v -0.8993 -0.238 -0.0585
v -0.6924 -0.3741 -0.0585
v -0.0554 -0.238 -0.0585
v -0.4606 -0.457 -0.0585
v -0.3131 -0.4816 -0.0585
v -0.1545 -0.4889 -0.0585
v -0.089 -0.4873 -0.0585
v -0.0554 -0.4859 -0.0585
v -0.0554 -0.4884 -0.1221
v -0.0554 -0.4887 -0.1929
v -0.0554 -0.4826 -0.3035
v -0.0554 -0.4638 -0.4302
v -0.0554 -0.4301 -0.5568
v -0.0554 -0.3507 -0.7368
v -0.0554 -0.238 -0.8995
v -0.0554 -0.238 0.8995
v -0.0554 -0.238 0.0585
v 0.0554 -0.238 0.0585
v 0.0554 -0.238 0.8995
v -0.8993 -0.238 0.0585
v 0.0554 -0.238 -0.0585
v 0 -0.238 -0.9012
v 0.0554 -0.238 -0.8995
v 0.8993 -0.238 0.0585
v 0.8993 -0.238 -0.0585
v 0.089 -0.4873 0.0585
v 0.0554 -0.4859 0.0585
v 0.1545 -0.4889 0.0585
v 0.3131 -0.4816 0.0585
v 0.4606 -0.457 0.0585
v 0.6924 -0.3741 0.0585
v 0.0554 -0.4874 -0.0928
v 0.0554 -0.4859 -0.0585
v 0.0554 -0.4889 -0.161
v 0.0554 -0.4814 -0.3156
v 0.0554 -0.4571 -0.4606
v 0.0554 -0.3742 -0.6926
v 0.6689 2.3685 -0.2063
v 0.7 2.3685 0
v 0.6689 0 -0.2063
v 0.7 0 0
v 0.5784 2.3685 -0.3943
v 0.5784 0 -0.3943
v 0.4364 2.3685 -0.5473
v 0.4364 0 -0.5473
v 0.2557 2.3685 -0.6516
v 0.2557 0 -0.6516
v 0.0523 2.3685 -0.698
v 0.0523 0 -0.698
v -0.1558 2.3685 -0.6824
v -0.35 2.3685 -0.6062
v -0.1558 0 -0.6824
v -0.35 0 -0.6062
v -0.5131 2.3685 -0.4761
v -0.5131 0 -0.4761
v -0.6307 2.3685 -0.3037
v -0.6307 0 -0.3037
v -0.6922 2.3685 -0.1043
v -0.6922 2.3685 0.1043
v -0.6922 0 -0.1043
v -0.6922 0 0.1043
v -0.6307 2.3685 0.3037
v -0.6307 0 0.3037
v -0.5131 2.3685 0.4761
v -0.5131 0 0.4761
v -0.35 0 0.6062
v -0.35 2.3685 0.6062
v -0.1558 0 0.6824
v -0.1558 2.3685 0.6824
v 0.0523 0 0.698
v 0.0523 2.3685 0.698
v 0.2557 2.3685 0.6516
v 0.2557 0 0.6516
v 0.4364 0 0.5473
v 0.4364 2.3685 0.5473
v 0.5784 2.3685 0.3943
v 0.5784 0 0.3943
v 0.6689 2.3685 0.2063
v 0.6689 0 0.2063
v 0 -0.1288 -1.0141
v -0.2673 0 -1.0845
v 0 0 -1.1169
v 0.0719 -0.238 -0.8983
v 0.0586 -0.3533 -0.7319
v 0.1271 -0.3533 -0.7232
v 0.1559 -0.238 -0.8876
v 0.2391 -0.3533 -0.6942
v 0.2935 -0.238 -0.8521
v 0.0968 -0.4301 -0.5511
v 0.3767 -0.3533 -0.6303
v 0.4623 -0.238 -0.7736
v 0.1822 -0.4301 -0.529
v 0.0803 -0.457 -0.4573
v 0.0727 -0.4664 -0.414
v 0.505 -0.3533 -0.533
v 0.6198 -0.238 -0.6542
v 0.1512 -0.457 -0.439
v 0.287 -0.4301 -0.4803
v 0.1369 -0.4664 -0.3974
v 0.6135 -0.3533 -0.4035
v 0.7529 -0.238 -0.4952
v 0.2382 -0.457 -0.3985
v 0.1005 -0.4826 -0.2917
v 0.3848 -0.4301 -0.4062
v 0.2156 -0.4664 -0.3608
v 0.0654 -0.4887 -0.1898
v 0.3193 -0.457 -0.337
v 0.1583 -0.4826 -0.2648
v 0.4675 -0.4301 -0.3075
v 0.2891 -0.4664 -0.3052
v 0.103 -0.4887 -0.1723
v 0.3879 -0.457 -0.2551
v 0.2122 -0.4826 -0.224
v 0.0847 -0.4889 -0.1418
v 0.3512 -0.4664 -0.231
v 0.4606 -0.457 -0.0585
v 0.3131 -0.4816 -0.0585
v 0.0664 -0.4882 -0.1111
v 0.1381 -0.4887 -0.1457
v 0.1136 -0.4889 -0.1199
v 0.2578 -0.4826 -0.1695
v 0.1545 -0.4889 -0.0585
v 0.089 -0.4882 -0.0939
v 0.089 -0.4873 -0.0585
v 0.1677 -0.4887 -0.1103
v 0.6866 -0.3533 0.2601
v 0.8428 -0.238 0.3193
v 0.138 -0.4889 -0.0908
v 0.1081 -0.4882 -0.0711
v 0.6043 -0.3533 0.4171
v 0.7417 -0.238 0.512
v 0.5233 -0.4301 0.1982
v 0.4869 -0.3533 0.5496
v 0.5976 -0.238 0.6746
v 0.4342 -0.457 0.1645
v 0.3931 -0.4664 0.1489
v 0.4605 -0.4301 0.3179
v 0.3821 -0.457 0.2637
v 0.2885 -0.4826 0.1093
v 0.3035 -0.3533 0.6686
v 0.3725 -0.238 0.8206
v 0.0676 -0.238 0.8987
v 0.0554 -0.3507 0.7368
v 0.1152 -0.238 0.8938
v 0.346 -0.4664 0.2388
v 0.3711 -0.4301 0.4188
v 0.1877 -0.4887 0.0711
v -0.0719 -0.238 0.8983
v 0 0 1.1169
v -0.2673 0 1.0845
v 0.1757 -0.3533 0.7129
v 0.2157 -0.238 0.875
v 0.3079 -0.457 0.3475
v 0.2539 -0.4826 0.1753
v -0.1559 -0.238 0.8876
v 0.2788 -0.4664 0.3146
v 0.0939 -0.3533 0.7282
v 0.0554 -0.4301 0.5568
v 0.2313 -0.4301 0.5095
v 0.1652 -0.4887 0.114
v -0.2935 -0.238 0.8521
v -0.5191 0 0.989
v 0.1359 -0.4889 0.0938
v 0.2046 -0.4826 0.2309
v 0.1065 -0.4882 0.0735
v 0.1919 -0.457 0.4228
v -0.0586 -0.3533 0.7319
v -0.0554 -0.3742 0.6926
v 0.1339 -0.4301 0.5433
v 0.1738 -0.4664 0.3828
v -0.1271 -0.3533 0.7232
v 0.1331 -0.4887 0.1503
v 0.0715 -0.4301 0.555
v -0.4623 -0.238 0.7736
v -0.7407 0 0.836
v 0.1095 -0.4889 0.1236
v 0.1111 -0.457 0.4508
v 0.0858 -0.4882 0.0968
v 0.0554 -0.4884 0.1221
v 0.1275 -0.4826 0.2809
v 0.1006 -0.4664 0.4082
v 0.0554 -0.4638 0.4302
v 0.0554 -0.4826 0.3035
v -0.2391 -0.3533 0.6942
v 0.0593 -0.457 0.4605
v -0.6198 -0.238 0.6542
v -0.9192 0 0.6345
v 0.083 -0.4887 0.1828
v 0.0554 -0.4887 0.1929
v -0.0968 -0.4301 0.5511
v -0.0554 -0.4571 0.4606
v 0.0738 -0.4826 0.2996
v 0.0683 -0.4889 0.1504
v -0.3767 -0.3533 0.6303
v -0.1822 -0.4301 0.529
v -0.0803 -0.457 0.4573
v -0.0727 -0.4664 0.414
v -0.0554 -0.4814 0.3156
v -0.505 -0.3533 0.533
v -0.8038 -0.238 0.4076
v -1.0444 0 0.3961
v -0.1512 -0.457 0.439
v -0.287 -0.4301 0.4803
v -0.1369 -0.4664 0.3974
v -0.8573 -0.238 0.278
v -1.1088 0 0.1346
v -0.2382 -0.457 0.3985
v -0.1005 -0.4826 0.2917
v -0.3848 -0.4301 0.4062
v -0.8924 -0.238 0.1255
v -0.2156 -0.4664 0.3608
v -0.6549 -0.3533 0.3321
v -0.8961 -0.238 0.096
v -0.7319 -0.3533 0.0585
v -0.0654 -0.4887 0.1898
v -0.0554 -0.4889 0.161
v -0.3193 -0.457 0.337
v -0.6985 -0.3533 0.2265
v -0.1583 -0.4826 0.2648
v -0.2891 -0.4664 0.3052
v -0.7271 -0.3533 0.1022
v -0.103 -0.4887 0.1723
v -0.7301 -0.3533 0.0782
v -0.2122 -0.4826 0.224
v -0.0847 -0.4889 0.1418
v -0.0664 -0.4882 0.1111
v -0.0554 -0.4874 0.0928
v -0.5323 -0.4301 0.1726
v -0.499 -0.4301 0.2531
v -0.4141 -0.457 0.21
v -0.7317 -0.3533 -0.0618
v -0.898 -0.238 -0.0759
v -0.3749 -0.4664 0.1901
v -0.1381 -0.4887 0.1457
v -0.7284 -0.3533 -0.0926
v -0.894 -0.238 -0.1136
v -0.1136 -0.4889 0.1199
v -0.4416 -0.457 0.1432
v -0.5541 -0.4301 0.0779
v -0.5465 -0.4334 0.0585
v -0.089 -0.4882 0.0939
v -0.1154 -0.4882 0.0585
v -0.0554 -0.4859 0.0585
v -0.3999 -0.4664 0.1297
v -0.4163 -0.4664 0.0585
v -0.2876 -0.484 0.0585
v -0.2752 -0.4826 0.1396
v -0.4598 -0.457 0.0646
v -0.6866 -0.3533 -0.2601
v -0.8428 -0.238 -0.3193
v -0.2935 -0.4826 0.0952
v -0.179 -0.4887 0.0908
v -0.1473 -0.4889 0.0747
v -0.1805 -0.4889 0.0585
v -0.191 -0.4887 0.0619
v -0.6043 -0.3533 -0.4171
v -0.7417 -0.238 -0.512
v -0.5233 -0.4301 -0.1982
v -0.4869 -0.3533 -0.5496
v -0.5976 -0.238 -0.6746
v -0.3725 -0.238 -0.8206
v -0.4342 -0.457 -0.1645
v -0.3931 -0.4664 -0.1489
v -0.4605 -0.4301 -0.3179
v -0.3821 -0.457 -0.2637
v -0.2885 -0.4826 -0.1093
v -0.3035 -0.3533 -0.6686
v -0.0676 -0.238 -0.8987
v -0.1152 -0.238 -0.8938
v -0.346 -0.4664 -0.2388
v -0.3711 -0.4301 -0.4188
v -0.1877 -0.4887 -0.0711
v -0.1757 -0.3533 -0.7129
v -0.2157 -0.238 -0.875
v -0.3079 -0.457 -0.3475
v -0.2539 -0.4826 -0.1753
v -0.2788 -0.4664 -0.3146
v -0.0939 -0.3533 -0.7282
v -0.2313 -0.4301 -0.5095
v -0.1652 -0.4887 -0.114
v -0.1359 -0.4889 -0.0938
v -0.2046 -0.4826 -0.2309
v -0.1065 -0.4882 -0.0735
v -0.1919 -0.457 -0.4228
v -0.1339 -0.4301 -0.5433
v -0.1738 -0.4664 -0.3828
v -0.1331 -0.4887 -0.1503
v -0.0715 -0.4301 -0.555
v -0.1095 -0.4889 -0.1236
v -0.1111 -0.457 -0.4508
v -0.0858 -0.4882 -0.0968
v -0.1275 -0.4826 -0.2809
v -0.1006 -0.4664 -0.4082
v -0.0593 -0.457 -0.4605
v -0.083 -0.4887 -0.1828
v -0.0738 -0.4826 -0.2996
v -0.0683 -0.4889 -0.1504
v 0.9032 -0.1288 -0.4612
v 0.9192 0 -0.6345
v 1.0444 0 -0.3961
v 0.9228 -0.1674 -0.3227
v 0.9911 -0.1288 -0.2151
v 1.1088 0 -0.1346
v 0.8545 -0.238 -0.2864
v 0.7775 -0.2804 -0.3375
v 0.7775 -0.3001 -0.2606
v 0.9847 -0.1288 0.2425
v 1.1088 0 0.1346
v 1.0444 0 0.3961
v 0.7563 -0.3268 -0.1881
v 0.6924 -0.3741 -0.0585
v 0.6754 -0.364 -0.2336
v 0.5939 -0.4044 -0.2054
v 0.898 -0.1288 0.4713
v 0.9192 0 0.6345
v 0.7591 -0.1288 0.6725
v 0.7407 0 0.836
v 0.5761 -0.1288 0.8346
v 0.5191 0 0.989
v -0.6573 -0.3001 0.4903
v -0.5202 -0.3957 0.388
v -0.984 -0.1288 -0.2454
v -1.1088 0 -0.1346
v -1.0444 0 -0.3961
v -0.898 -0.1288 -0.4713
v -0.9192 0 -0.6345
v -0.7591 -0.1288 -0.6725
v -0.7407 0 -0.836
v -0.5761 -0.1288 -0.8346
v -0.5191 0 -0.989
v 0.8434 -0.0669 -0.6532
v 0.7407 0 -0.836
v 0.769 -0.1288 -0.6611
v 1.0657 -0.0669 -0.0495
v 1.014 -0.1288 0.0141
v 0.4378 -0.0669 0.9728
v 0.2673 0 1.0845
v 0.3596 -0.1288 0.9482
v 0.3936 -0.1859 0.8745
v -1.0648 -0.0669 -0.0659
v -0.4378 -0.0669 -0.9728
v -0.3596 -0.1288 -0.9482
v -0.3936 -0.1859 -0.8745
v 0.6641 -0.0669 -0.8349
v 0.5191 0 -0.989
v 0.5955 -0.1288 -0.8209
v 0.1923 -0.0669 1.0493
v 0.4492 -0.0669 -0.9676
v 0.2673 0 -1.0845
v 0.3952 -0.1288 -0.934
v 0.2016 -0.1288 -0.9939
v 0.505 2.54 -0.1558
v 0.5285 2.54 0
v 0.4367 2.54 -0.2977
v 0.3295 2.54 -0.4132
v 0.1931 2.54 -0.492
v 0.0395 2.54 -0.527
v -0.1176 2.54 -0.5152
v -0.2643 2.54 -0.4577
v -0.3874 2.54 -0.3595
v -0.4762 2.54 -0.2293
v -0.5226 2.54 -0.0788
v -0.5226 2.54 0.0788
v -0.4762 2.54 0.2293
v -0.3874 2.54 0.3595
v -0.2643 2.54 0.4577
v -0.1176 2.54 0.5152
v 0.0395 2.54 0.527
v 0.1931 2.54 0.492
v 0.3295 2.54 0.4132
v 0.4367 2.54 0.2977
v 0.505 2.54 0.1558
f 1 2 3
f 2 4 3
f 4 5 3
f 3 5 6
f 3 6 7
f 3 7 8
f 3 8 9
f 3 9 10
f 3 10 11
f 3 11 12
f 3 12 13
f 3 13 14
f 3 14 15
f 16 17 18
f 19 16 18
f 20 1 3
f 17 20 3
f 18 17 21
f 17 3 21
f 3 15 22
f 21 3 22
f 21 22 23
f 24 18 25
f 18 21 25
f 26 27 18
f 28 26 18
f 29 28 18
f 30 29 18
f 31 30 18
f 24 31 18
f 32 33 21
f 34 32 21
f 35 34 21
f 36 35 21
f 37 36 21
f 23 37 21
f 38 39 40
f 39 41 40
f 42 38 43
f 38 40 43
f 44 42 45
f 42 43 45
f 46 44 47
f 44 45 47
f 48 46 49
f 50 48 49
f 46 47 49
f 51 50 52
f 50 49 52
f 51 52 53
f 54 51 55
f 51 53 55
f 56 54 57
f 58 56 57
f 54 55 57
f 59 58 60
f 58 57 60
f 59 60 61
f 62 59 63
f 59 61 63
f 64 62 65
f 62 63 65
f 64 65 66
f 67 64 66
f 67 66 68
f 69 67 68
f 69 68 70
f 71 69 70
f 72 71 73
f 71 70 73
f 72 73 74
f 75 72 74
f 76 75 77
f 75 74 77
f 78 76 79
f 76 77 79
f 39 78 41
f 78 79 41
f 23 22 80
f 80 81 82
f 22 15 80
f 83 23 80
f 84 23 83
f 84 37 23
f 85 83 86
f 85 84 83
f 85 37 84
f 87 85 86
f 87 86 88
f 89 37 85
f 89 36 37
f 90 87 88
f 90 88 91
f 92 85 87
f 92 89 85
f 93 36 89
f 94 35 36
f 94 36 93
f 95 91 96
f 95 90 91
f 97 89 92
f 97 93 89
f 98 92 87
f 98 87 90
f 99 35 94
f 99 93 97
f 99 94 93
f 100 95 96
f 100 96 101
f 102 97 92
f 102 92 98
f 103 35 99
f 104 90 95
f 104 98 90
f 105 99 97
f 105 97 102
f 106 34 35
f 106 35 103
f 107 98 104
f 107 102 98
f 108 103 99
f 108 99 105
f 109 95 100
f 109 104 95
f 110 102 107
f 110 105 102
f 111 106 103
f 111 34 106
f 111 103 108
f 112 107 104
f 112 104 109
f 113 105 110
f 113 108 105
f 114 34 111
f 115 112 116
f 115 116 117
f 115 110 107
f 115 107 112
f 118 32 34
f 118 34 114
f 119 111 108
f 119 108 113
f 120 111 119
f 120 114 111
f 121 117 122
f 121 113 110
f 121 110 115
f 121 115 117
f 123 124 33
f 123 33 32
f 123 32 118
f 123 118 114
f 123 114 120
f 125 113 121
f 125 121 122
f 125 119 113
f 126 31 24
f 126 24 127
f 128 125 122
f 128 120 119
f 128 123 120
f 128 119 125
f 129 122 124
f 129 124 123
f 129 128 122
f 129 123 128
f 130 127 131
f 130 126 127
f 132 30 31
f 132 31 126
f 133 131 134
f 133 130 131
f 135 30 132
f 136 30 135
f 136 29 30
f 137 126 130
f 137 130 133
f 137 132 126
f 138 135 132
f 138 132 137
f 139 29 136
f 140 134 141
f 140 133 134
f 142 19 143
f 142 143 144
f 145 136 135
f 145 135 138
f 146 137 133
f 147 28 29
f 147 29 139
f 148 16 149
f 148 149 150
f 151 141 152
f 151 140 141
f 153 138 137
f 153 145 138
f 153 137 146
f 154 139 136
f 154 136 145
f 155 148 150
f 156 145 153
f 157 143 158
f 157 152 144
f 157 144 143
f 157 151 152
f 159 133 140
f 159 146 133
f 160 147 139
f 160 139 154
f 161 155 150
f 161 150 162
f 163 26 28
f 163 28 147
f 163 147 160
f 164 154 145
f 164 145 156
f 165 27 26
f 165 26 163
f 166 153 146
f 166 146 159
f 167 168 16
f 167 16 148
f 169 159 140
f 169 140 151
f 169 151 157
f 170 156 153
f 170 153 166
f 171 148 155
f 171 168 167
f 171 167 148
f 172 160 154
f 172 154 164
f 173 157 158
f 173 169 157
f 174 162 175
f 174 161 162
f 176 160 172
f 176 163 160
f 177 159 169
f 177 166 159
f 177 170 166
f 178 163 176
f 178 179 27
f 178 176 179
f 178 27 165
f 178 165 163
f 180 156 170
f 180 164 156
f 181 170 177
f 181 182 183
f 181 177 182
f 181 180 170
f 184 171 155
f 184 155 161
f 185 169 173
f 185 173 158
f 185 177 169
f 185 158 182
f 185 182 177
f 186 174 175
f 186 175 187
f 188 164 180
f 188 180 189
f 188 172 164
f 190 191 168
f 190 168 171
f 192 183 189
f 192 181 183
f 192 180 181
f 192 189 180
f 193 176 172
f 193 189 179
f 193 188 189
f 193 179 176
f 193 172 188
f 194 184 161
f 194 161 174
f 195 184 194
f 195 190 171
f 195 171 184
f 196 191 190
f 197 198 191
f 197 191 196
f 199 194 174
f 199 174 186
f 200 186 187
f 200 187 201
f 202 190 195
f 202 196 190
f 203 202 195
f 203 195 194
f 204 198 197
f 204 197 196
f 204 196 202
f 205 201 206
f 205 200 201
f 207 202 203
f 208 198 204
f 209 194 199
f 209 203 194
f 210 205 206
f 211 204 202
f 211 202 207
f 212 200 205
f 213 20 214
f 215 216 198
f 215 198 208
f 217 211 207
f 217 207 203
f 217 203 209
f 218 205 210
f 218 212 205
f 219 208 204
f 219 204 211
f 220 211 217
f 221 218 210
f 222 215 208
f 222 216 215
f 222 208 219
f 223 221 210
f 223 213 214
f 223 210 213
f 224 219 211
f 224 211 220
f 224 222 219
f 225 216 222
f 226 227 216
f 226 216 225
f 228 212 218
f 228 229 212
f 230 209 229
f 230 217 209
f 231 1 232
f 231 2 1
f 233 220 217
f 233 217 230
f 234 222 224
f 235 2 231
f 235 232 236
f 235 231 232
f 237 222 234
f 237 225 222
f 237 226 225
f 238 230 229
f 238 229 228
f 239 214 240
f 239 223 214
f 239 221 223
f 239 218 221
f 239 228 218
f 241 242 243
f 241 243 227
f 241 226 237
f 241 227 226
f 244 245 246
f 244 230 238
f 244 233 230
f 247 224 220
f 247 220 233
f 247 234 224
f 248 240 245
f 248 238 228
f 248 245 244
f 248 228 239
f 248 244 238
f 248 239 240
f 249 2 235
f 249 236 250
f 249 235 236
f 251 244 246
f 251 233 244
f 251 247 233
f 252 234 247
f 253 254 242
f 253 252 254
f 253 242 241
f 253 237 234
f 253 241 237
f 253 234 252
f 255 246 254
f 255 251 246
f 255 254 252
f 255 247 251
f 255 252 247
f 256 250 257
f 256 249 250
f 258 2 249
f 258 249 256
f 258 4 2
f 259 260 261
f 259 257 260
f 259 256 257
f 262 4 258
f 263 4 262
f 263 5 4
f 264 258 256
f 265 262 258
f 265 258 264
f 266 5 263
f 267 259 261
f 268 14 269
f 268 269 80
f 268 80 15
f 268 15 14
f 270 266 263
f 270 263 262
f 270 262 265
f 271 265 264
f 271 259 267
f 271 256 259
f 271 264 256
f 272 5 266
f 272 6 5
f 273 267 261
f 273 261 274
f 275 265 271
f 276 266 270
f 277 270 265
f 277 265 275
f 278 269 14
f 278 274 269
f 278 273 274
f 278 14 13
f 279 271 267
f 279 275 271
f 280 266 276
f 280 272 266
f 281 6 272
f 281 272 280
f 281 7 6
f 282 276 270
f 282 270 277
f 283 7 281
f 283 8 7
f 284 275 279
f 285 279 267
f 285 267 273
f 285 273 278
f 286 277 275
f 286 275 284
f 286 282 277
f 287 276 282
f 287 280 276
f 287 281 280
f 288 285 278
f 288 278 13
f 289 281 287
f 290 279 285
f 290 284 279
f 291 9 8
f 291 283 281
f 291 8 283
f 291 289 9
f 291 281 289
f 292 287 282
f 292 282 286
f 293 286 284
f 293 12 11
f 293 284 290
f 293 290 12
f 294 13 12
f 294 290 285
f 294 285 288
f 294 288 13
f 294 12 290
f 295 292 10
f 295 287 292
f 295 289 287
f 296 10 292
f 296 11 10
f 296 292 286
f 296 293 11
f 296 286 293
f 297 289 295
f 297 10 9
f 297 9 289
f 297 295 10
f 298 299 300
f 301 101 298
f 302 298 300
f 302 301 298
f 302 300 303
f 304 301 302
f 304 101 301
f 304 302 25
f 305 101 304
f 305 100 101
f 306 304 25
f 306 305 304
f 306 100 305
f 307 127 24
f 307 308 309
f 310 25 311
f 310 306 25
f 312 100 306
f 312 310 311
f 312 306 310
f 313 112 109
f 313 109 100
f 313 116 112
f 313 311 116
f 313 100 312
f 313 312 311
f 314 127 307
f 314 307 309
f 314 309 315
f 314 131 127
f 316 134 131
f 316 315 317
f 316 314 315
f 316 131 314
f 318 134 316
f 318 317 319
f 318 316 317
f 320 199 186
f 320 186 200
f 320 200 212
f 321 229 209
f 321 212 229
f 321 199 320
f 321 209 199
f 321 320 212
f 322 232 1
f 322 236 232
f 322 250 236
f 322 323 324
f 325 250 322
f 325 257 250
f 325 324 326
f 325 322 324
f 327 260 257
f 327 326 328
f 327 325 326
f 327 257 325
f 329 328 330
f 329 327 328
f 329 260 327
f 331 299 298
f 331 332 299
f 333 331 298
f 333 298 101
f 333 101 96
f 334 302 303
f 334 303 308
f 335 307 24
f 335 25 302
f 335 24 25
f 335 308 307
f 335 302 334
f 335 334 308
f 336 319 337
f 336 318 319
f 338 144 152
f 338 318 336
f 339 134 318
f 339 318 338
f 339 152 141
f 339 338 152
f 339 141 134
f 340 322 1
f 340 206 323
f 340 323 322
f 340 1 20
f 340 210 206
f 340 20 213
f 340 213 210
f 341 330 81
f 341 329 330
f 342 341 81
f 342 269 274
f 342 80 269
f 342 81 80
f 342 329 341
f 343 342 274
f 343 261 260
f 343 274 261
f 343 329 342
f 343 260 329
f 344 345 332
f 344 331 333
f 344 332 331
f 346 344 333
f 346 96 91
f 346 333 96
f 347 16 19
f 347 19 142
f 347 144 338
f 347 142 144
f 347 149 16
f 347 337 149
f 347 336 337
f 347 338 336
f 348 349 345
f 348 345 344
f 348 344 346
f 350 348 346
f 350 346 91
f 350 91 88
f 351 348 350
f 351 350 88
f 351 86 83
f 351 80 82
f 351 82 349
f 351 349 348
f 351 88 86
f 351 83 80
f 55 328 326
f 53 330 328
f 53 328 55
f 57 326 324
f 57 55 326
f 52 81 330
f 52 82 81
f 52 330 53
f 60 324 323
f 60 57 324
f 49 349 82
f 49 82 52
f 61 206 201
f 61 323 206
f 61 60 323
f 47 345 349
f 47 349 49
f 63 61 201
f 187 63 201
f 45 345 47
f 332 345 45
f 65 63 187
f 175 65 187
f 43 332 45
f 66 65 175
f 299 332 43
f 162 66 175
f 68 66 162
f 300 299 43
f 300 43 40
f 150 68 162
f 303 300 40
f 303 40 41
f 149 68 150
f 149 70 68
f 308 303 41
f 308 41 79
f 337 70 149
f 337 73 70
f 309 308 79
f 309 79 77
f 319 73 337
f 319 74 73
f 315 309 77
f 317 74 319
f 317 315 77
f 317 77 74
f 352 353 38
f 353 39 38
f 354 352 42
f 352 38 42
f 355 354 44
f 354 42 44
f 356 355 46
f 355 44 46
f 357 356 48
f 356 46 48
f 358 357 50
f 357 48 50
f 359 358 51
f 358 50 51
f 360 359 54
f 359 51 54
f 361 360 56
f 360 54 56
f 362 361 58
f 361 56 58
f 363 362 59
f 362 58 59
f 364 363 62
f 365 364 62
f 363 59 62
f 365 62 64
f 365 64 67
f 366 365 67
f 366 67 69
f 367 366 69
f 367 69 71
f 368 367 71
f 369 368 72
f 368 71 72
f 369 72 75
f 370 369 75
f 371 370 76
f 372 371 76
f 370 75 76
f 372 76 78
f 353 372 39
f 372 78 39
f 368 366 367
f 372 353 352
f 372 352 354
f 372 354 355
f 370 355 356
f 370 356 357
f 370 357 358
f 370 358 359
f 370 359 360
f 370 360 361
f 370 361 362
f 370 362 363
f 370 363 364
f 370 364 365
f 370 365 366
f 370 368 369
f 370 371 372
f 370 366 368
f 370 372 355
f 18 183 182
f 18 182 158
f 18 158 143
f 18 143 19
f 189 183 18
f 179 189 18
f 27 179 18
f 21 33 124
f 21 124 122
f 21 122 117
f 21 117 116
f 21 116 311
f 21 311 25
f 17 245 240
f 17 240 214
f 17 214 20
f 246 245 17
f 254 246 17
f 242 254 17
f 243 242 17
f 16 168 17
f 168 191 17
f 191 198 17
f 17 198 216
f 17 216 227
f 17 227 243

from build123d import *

# Parameters (mm, degrees)
SKETCH1_R           = 0.75
BOSS_EXTRUDE1_DEPTH = 2.54
SKETCH5_W           = 0.967191405
SKETCH5_H           = 0.117048642
SKETCH5_W_2         = 0.110888186
SKETCH5_H_2         = 0.950250154
CUT_EXTRUDE1_DEPTH  = 0.762


# Read off the part's stored shape, not the designer's step: M1.4x0.3 Machine Threads Stud1
with BuildPart() as part:
    # Sketch1 → Boss-Extrude1 (new body)
    with BuildSketch(Plane(origin=(0, 0, 0), x_dir=(1, 0, 0), z_dir=(0, 1, 0))):
        with Locations(Location((0, 0, 0), (0, 0, 270))):
            Circle(SKETCH1_R)
    extrude(amount=BOSS_EXTRUDE1_DEPTH)

    # M1.4x0.3 Machine Threads Stud1 outline → M1.4x0.3 Machine Threads Stud1 (revolve, cut)
    with BuildSketch(Plane.XY):
        Polygon((0.75, 2.54), (0.5285, 2.54), (0.7, 2.3685), (0.7, 0), (0.75, 0), align=None)
    revolve(axis=Axis((0, 0, 0), (0, 1, 0)), mode=Mode.SUBTRACT)

    # Sketch4 → Revolve1 (revolve)
    with BuildSketch(Plane.XY, mode=Mode.PRIVATE) as revolve1_sk:
        with BuildLine():
            add(Edge.make_bspline(
                [(1.116948717, 0), (0.722805152, -0.559065826), (0, -0.478908216)],
                knots=[0, 0, 0, 1, 1, 1], degree=2))
            Line((0, -0.478908216), (0, 0))
            Line((0, 0), (1.116948717, 0))
        make_face()
    revolve(revolve1_sk.sketch.rotate(Axis((0, 0, 0), (0, -1, 0)), 270), axis=Axis((0, 0, 0), (0, -1, 0)))

    # Sketch5 → Cut-Extrude1 (cut)
    with BuildSketch(Plane(origin=(0, -1.000000032, 0), x_dir=(1, 0, 0), z_dir=(0, 1, 0))):
        with Locations((-0.539039796, 0)):
            Rectangle(SKETCH5_W, SKETCH5_H)
        with Locations((0, -0.533649398)):
            Rectangle(SKETCH5_W_2, SKETCH5_H_2)
        with Locations((0.539039796, 0)):
            Rectangle(SKETCH5_W, SKETCH5_H)
        with Locations((0, 0.533649398)):
            Rectangle(SKETCH5_W_2, SKETCH5_H_2)
        Rectangle(SKETCH5_W_2, SKETCH5_H)
    extrude(amount=CUT_EXTRUDE1_DEPTH, mode=Mode.SUBTRACT)


solid = part.part
